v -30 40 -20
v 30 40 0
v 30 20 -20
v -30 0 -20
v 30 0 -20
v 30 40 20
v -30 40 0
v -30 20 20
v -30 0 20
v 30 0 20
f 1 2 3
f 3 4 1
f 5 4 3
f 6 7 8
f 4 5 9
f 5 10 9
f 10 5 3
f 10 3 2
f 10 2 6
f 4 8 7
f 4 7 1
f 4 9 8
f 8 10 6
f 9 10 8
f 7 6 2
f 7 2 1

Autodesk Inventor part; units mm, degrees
ref_plane "YZ Plane" through (0, 0, 0) normal (1, 0, 0) x (0, 1, 0)
ref_plane "XZ Plane" through (0, 0, 0) normal (0, 1, 0) x (-1, 0, 0)
ref_plane "XY Plane" through (0, 0, 0) normal (0, 0, 1) x (1, 0, 0)
sketch "草圖1" plane through (0, 0, 0) normal (0, 1, 0) x (-1, 0, 0)
  line L0 (-30, 20) -> (30, 20)
  line L1 (30, 20) -> (30, -20)
  line L2 (30, -20) -> (-30, -20)
  line L3 (-30, -20) -> (-30, 20)
  line L4 (-30, 20) -> (30, -20) construction
  line L5 (30, 20) -> (-30, -20) construction
  point P0 (0, 0)
  dimension "d0" = 40
  dimension "d1" = 60
extrude "擠出1" add sketch "草圖1" along normal blind 40
sketch "草圖2" plane through (-30, 0, -20) normal (-1, 0, 0) x (0, 0, 1)
  line L0 (40, 40) -> (0, 40) construction
  line L1 (20, 40) -> (40, 20)
  line L2 (40, 20) -> (40, 40)
  line L3 (40, 40) -> (20, 40)
  point P0 (20, 0)
  dimension "d4" = 20
loft "斷面混成1" cut profiles "草圖2" section 2 point at (30, 40, 20)
sketch "草圖4" plane through (30, 0, 20) normal (1, 0, 0) x (0, 0, -1)
  line L0 (0, 40) -> (40, 40) construction
  line L1 (40, 40) -> (40, 0) construction
  line L2 (40, 0) -> (0, 0) construction
  line L3 (0, 0) -> (0, 40) construction
  line L4 (0, 20) -> (20, 40) construction
  line L5 (20, 40) -> (40, 20)
  line L6 (40, 0) -> (40, 40) construction
  line L7 (40, 20) -> (40, 40)
  line L8 (40, 40) -> (20, 40) projected
  line L9 (40, 40) -> (20, 40)
  point P0 (20, 0)
  dimension "d9" = 20
loft "斷面混成2" cut profiles "草圖4" section 2 point at (-30, 40, -20)
properties part number "14" material "鋼、碳鋼"
